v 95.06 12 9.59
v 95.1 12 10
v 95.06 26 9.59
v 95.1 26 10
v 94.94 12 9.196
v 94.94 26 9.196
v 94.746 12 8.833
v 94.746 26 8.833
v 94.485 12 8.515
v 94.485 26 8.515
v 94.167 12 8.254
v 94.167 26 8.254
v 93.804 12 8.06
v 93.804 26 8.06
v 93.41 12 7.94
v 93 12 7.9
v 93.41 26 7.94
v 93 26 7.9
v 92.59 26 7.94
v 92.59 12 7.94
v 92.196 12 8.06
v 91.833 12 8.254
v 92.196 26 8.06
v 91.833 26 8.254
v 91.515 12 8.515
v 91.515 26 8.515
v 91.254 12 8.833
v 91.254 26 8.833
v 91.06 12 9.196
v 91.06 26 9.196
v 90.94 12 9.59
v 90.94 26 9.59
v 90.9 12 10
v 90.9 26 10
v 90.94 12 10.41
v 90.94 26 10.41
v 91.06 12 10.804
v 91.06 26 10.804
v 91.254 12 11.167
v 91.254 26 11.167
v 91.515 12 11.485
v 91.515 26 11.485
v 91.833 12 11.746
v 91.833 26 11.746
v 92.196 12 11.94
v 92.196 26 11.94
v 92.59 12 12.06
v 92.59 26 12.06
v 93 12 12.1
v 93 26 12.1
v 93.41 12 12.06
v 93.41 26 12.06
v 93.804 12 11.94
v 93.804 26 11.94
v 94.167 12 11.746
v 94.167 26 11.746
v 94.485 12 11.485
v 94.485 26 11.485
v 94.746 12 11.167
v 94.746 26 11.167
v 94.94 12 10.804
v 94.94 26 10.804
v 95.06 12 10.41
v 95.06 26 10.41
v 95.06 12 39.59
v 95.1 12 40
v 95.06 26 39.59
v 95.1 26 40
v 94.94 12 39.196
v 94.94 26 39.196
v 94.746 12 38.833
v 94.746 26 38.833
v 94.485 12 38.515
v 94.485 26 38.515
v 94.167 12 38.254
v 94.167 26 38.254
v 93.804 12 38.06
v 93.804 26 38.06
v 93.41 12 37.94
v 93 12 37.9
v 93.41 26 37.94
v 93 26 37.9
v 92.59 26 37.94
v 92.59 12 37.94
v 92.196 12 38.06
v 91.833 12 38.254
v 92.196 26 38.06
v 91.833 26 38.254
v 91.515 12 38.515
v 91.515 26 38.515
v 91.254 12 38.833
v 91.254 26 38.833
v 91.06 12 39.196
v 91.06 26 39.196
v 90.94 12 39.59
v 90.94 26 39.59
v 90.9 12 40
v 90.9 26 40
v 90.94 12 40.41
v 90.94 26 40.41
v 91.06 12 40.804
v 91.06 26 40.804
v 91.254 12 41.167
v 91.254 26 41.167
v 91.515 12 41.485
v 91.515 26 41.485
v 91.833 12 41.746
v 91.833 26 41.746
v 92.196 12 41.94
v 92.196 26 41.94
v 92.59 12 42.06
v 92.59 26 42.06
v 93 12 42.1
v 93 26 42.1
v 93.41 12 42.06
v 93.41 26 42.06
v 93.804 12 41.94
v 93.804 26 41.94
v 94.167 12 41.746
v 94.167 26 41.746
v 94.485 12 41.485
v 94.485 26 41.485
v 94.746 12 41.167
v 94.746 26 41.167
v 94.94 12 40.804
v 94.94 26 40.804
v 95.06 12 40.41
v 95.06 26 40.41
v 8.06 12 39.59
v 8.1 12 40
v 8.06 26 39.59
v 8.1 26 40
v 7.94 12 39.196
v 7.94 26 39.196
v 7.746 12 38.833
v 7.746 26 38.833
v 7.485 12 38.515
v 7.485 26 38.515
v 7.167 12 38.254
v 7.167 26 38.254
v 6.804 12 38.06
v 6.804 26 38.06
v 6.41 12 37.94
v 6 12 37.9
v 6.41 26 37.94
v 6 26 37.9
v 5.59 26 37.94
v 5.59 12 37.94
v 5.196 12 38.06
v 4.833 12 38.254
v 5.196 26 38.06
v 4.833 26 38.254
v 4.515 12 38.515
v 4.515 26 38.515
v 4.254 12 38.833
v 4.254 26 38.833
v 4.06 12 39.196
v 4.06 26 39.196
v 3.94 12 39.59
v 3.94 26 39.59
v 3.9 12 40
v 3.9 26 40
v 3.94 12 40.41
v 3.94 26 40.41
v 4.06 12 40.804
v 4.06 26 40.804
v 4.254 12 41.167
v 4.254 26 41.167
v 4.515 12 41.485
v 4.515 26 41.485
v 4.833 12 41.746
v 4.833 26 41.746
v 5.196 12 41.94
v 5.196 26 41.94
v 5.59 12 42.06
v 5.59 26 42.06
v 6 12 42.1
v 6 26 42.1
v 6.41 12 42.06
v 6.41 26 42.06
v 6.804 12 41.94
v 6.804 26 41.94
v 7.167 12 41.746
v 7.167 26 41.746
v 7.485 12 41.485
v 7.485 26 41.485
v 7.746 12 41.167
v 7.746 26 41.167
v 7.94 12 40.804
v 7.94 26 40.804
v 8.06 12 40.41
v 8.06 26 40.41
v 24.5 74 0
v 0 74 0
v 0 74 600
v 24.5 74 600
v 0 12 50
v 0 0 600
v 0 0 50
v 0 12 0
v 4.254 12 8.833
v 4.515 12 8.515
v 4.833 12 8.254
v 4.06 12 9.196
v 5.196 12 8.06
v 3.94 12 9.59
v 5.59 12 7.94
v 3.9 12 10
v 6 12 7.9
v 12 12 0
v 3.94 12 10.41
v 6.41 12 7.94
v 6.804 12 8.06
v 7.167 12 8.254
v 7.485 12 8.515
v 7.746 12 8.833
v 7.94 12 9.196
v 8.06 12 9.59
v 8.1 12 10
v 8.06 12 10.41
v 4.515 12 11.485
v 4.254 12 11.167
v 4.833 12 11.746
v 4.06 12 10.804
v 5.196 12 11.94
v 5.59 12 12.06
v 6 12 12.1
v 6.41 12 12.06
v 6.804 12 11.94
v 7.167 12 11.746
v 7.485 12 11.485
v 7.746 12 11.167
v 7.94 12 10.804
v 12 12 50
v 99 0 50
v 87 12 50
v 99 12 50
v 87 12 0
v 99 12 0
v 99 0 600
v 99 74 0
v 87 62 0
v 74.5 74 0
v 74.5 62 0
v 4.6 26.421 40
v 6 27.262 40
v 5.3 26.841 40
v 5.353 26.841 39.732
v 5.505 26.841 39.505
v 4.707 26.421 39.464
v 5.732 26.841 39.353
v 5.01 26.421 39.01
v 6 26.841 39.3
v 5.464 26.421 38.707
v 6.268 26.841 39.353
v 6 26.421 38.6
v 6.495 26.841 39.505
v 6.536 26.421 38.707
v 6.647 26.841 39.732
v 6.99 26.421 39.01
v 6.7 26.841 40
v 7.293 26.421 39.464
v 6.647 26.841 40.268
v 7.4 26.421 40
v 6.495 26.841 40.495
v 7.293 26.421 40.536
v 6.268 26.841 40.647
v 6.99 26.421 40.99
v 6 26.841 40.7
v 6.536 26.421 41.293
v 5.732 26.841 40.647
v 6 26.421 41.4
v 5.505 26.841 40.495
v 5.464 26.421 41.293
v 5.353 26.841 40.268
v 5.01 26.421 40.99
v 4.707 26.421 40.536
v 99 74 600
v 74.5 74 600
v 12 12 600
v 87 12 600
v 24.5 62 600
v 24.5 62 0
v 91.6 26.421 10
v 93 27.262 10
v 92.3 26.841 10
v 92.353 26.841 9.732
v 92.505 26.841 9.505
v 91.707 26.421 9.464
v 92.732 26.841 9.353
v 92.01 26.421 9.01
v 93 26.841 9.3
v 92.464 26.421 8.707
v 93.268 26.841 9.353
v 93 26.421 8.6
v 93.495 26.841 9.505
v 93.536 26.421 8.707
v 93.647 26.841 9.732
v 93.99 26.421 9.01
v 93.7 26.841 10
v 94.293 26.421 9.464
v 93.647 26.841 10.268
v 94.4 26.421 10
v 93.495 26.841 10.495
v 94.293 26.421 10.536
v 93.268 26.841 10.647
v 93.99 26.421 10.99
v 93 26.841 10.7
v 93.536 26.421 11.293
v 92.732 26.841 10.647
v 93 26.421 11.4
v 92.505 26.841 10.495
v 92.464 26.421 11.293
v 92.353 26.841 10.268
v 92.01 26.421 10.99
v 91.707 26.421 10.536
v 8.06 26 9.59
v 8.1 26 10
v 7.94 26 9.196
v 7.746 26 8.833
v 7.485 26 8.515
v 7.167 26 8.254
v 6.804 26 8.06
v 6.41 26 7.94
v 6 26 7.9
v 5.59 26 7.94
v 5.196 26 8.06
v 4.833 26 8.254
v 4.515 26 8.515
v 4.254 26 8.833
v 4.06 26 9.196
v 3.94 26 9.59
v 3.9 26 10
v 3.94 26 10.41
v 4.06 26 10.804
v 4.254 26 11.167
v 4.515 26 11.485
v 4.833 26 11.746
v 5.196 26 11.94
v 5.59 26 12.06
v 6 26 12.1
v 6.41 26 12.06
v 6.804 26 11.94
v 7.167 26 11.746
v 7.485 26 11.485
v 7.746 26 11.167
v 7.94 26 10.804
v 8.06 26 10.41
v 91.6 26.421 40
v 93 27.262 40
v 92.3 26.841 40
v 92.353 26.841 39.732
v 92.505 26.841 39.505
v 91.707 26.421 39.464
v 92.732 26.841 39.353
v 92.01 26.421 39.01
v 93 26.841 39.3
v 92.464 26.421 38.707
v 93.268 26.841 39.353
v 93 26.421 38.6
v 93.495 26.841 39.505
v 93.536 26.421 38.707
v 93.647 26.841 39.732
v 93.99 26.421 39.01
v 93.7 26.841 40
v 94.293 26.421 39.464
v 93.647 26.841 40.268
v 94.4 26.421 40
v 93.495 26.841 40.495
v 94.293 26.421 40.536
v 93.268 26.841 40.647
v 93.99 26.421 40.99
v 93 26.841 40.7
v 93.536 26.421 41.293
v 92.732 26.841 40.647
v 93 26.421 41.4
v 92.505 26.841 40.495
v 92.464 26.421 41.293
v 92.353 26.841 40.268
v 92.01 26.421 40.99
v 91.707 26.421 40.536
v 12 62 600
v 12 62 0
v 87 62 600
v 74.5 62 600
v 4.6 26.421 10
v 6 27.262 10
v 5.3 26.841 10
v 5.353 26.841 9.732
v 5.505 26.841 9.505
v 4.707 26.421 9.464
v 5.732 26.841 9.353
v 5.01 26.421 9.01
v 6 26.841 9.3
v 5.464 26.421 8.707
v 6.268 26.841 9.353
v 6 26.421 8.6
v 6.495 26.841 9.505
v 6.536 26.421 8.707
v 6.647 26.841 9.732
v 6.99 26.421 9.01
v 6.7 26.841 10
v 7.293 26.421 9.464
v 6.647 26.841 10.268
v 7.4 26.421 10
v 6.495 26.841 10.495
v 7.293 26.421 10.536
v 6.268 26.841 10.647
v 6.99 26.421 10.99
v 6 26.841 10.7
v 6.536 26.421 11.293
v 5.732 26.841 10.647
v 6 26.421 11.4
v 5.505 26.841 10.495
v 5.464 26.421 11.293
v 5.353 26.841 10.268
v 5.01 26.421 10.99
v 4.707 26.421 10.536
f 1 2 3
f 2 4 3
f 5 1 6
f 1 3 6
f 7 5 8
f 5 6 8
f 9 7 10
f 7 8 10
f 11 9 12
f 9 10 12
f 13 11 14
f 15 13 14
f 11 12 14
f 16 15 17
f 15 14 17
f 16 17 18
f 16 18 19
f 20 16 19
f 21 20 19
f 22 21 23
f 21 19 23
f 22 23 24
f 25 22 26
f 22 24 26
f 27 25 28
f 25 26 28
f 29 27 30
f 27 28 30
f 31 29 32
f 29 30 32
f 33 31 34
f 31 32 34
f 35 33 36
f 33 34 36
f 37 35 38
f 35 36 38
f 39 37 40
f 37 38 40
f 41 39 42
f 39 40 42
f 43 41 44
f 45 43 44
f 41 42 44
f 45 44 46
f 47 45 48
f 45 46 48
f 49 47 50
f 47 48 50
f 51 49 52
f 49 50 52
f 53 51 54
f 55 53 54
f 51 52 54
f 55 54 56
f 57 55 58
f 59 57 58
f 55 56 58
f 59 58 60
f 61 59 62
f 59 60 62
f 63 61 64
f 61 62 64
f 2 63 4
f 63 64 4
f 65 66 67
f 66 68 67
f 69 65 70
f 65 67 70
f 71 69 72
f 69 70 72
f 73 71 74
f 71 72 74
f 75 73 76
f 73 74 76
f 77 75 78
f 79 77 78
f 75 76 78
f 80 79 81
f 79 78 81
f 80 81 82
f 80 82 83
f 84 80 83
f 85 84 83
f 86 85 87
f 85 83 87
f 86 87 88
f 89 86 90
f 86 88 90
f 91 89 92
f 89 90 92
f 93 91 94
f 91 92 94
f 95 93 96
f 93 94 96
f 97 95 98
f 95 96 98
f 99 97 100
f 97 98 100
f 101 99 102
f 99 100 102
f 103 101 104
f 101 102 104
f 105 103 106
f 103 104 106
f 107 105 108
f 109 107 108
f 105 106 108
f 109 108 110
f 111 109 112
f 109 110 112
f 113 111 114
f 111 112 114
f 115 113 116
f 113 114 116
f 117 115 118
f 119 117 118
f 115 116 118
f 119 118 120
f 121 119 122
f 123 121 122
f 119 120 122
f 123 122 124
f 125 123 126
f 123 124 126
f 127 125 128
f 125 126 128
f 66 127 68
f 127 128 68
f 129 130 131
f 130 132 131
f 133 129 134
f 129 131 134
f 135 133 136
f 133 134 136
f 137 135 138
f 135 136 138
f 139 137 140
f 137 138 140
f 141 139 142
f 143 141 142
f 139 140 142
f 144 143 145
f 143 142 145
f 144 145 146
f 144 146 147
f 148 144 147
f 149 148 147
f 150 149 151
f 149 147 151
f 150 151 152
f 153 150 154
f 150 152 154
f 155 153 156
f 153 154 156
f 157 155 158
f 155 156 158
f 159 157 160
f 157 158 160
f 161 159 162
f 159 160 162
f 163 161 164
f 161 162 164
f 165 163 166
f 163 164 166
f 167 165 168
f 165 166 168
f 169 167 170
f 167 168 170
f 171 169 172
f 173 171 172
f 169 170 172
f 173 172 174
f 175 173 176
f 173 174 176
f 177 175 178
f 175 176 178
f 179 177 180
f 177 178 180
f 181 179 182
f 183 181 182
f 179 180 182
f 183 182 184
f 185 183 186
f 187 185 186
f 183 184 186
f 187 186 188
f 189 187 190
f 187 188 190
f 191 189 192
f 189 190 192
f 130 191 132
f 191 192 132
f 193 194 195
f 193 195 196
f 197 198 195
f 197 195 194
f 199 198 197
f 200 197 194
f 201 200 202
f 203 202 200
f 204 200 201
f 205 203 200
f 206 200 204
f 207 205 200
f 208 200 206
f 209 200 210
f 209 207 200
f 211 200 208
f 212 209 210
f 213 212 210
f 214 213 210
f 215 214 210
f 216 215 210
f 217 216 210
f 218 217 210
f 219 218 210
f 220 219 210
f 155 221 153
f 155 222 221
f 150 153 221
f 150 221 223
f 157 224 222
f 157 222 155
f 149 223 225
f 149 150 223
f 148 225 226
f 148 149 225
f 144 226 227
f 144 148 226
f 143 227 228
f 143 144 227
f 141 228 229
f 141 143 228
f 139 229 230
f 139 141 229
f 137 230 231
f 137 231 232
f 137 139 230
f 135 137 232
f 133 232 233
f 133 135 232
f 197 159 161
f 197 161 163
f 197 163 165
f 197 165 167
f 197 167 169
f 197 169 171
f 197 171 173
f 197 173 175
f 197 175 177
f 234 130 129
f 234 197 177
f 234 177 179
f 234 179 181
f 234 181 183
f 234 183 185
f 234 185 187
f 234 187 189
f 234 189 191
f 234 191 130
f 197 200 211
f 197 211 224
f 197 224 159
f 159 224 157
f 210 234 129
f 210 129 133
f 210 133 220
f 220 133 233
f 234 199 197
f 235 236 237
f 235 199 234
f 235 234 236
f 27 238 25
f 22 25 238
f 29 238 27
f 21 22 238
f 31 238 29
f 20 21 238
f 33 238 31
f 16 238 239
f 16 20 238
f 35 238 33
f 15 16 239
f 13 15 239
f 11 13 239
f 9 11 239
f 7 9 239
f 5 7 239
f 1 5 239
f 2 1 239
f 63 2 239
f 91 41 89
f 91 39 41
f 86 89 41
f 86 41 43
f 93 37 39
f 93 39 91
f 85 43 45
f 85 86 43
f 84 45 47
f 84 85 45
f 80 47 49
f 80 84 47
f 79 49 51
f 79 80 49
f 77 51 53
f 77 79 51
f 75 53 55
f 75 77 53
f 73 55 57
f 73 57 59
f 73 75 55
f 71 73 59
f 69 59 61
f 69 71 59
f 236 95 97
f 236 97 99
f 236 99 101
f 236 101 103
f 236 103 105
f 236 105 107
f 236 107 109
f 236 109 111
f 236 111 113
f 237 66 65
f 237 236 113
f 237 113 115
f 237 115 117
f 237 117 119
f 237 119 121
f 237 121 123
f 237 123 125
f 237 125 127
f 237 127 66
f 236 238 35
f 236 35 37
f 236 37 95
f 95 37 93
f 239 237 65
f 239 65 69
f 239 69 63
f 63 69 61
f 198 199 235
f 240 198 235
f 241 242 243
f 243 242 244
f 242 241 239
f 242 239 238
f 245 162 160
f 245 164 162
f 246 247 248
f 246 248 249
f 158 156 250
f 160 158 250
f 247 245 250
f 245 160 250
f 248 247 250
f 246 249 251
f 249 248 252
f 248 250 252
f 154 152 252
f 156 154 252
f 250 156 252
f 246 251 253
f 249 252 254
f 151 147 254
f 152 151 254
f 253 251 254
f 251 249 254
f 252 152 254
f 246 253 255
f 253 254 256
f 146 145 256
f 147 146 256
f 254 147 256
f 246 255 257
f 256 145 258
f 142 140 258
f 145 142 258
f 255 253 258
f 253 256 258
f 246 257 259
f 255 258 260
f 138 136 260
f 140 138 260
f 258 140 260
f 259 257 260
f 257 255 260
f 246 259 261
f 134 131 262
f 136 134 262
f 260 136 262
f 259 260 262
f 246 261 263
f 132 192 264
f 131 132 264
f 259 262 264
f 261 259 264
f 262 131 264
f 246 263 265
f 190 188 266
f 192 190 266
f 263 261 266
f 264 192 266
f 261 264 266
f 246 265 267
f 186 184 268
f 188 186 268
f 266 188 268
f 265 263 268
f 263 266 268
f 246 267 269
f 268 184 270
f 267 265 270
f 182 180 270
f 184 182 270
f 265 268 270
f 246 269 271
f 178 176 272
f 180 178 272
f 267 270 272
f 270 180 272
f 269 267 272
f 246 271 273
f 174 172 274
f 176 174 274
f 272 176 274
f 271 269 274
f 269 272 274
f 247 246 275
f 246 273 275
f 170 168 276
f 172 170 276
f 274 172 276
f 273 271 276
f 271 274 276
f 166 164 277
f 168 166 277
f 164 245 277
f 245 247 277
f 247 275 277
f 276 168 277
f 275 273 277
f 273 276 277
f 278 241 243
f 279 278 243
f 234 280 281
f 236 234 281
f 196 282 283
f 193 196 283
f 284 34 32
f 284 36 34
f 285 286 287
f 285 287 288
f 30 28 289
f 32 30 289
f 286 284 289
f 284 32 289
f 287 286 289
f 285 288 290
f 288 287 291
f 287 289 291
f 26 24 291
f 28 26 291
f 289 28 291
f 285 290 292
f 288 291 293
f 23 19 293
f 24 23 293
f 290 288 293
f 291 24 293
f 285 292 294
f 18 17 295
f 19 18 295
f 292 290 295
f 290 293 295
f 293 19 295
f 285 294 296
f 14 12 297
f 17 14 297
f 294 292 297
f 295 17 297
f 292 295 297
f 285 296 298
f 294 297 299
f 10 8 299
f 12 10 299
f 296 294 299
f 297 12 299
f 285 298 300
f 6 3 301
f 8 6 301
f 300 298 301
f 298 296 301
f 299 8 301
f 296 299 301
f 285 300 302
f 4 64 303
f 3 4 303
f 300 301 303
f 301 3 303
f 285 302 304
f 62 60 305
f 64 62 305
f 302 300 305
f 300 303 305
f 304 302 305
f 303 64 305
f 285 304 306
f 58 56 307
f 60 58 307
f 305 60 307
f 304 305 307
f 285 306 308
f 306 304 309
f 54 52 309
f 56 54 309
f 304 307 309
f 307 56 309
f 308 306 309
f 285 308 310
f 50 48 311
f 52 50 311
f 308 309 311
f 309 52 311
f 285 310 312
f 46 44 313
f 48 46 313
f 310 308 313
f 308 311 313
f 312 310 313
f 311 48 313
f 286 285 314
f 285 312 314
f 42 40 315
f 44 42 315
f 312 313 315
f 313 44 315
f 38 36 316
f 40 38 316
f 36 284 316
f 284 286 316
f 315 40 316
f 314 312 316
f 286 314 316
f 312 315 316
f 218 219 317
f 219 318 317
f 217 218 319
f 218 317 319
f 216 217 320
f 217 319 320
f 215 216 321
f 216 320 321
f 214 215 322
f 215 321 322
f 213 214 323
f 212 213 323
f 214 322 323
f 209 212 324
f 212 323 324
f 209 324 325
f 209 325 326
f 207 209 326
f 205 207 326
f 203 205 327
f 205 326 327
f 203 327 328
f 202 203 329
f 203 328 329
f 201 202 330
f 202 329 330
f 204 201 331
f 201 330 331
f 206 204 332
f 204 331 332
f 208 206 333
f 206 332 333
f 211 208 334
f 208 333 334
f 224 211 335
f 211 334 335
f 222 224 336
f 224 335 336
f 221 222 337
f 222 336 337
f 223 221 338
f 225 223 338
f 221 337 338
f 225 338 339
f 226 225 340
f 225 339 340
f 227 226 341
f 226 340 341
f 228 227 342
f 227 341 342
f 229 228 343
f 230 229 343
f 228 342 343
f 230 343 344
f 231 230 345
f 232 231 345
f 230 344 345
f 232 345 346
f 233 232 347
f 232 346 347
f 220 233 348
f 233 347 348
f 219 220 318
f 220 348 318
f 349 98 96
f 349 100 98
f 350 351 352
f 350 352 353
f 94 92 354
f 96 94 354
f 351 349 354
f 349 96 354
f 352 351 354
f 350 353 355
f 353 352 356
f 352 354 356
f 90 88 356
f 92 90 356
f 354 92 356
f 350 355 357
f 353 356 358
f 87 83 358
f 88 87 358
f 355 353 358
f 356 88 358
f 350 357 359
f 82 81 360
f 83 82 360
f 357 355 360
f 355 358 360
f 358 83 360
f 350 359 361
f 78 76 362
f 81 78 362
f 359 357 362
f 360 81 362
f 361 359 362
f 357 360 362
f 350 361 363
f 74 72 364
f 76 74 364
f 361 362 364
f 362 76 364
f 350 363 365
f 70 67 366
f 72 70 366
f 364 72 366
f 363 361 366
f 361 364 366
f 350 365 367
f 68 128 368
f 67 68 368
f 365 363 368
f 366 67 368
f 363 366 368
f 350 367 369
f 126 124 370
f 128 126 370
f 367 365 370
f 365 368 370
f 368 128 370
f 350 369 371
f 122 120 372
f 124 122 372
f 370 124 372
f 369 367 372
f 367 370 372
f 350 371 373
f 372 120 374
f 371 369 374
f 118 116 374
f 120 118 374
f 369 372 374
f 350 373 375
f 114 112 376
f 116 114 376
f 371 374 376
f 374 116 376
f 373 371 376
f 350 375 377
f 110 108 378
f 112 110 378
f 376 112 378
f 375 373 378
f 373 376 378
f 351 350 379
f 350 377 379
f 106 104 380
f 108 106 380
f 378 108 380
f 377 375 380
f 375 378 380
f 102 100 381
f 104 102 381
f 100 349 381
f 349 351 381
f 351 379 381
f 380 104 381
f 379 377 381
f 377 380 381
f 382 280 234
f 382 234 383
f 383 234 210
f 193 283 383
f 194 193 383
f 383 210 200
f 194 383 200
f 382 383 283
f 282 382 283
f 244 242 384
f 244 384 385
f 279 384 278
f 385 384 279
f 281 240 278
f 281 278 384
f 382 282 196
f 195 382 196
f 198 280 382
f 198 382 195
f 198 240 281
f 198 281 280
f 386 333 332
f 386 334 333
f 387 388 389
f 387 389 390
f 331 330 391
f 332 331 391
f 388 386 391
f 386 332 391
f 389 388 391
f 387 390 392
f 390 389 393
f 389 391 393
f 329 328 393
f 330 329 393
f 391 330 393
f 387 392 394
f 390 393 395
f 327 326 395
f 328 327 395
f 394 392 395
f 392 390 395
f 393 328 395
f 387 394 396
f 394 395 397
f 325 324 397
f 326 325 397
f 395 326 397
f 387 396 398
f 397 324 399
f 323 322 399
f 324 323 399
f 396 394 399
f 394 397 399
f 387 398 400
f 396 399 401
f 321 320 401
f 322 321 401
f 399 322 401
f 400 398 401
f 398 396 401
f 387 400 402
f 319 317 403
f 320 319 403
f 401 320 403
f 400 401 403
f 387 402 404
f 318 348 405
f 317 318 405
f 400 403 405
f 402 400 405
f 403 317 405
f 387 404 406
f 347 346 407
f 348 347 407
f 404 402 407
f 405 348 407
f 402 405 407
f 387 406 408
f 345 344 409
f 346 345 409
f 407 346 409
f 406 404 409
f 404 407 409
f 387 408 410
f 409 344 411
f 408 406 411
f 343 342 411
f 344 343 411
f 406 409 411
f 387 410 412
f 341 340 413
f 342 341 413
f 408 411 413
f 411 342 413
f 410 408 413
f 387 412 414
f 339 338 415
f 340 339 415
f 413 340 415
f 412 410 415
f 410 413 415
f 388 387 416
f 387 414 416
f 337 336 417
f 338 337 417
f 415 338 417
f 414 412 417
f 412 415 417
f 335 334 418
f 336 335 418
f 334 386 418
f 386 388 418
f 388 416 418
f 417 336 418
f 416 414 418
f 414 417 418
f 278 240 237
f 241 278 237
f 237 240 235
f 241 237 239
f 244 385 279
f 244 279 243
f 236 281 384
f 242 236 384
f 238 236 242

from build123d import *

# Parameters (mm, degrees)
SKETCH1_W                         = 99
SKETCH1_H                         = 12
BASEPLATE_DEPTH                   = 600
SKETCH2_W                         = 12
SKETCH2_H                         = 600
SIDE_RAIL_DEPTH                   = 50
SKETCH3_W                         = 24.5
SKETCH3_H                         = 600
KEEPER_RAIL_DEPTH                 = 12
SKETCH5_W                         = 99
SKETCH5_H                         = 50
LAP_JOINT_CUTOUT_DEPTH            = 12
LAP_JOINT_BOLT_HOLE_PATTERN_D     = 4.2
LAP_JOINT_BOLT_HOLE_PATTERN_DEPTH = 14
LAP_JOINT_BOLT_HOLE_PATTERN_TIP   = 1.2618073


with BuildPart() as part:
    # Sketch1 → baseplate (new body)
    with BuildSketch(Plane.XY):
        with Locations((49.5, 6)):
            Rectangle(SKETCH1_W, SKETCH1_H)
    extrude(amount=BASEPLATE_DEPTH)

    # Sketch2 → side_rail (add)
    with BuildSketch(Plane(origin=(0, 12, 0), x_dir=(1, 0, 0), z_dir=(0, 1, 0))):
        with Locations((6, -300)):
            Rectangle(SKETCH2_W, SKETCH2_H)
    side_rail = extrude(amount=SIDE_RAIL_DEPTH)

    # Sketch3 → keeper rail (add)
    with BuildSketch(Plane(origin=(0, 62, 0), x_dir=(1, 0, 0), z_dir=(0, 1, 0))):
        with Locations((12.25, -300)):
            Rectangle(SKETCH3_W, SKETCH3_H)
    keeper_rail = extrude(amount=KEEPER_RAIL_DEPTH)

    # mirror rails: side_rail, keeper rail across plane
    add(side_rail.mirror(Plane.ZY.offset(-49.5)))
    add(keeper_rail.mirror(Plane.ZY.offset(-49.5)))

    # Sketch5 → lap joint cutout (cut)
    with BuildSketch(Plane.XZ):
        with Locations((49.5, 25)):
            Rectangle(SKETCH5_W, SKETCH5_H)
    extrude(amount=-LAP_JOINT_CUTOUT_DEPTH, mode=Mode.SUBTRACT)

    # lap joint bolt hole pattern
    with Locations(Plane(origin=(0, 12, 0), x_dir=(-1, 0, 0), z_dir=(0, -1, 0))):
        with Locations((-93, -10), (-6, -40), (-93, -40), (-6, -10)):
            Hole(LAP_JOINT_BOLT_HOLE_PATTERN_D / 2, depth=LAP_JOINT_BOLT_HOLE_PATTERN_DEPTH)
            with Locations((0, 0, -(LAP_JOINT_BOLT_HOLE_PATTERN_DEPTH + LAP_JOINT_BOLT_HOLE_PATTERN_TIP / 2))):  # 118° drill point
                Cone(0, LAP_JOINT_BOLT_HOLE_PATTERN_D / 2, LAP_JOINT_BOLT_HOLE_PATTERN_TIP, mode=Mode.SUBTRACT)


solid = part.part
